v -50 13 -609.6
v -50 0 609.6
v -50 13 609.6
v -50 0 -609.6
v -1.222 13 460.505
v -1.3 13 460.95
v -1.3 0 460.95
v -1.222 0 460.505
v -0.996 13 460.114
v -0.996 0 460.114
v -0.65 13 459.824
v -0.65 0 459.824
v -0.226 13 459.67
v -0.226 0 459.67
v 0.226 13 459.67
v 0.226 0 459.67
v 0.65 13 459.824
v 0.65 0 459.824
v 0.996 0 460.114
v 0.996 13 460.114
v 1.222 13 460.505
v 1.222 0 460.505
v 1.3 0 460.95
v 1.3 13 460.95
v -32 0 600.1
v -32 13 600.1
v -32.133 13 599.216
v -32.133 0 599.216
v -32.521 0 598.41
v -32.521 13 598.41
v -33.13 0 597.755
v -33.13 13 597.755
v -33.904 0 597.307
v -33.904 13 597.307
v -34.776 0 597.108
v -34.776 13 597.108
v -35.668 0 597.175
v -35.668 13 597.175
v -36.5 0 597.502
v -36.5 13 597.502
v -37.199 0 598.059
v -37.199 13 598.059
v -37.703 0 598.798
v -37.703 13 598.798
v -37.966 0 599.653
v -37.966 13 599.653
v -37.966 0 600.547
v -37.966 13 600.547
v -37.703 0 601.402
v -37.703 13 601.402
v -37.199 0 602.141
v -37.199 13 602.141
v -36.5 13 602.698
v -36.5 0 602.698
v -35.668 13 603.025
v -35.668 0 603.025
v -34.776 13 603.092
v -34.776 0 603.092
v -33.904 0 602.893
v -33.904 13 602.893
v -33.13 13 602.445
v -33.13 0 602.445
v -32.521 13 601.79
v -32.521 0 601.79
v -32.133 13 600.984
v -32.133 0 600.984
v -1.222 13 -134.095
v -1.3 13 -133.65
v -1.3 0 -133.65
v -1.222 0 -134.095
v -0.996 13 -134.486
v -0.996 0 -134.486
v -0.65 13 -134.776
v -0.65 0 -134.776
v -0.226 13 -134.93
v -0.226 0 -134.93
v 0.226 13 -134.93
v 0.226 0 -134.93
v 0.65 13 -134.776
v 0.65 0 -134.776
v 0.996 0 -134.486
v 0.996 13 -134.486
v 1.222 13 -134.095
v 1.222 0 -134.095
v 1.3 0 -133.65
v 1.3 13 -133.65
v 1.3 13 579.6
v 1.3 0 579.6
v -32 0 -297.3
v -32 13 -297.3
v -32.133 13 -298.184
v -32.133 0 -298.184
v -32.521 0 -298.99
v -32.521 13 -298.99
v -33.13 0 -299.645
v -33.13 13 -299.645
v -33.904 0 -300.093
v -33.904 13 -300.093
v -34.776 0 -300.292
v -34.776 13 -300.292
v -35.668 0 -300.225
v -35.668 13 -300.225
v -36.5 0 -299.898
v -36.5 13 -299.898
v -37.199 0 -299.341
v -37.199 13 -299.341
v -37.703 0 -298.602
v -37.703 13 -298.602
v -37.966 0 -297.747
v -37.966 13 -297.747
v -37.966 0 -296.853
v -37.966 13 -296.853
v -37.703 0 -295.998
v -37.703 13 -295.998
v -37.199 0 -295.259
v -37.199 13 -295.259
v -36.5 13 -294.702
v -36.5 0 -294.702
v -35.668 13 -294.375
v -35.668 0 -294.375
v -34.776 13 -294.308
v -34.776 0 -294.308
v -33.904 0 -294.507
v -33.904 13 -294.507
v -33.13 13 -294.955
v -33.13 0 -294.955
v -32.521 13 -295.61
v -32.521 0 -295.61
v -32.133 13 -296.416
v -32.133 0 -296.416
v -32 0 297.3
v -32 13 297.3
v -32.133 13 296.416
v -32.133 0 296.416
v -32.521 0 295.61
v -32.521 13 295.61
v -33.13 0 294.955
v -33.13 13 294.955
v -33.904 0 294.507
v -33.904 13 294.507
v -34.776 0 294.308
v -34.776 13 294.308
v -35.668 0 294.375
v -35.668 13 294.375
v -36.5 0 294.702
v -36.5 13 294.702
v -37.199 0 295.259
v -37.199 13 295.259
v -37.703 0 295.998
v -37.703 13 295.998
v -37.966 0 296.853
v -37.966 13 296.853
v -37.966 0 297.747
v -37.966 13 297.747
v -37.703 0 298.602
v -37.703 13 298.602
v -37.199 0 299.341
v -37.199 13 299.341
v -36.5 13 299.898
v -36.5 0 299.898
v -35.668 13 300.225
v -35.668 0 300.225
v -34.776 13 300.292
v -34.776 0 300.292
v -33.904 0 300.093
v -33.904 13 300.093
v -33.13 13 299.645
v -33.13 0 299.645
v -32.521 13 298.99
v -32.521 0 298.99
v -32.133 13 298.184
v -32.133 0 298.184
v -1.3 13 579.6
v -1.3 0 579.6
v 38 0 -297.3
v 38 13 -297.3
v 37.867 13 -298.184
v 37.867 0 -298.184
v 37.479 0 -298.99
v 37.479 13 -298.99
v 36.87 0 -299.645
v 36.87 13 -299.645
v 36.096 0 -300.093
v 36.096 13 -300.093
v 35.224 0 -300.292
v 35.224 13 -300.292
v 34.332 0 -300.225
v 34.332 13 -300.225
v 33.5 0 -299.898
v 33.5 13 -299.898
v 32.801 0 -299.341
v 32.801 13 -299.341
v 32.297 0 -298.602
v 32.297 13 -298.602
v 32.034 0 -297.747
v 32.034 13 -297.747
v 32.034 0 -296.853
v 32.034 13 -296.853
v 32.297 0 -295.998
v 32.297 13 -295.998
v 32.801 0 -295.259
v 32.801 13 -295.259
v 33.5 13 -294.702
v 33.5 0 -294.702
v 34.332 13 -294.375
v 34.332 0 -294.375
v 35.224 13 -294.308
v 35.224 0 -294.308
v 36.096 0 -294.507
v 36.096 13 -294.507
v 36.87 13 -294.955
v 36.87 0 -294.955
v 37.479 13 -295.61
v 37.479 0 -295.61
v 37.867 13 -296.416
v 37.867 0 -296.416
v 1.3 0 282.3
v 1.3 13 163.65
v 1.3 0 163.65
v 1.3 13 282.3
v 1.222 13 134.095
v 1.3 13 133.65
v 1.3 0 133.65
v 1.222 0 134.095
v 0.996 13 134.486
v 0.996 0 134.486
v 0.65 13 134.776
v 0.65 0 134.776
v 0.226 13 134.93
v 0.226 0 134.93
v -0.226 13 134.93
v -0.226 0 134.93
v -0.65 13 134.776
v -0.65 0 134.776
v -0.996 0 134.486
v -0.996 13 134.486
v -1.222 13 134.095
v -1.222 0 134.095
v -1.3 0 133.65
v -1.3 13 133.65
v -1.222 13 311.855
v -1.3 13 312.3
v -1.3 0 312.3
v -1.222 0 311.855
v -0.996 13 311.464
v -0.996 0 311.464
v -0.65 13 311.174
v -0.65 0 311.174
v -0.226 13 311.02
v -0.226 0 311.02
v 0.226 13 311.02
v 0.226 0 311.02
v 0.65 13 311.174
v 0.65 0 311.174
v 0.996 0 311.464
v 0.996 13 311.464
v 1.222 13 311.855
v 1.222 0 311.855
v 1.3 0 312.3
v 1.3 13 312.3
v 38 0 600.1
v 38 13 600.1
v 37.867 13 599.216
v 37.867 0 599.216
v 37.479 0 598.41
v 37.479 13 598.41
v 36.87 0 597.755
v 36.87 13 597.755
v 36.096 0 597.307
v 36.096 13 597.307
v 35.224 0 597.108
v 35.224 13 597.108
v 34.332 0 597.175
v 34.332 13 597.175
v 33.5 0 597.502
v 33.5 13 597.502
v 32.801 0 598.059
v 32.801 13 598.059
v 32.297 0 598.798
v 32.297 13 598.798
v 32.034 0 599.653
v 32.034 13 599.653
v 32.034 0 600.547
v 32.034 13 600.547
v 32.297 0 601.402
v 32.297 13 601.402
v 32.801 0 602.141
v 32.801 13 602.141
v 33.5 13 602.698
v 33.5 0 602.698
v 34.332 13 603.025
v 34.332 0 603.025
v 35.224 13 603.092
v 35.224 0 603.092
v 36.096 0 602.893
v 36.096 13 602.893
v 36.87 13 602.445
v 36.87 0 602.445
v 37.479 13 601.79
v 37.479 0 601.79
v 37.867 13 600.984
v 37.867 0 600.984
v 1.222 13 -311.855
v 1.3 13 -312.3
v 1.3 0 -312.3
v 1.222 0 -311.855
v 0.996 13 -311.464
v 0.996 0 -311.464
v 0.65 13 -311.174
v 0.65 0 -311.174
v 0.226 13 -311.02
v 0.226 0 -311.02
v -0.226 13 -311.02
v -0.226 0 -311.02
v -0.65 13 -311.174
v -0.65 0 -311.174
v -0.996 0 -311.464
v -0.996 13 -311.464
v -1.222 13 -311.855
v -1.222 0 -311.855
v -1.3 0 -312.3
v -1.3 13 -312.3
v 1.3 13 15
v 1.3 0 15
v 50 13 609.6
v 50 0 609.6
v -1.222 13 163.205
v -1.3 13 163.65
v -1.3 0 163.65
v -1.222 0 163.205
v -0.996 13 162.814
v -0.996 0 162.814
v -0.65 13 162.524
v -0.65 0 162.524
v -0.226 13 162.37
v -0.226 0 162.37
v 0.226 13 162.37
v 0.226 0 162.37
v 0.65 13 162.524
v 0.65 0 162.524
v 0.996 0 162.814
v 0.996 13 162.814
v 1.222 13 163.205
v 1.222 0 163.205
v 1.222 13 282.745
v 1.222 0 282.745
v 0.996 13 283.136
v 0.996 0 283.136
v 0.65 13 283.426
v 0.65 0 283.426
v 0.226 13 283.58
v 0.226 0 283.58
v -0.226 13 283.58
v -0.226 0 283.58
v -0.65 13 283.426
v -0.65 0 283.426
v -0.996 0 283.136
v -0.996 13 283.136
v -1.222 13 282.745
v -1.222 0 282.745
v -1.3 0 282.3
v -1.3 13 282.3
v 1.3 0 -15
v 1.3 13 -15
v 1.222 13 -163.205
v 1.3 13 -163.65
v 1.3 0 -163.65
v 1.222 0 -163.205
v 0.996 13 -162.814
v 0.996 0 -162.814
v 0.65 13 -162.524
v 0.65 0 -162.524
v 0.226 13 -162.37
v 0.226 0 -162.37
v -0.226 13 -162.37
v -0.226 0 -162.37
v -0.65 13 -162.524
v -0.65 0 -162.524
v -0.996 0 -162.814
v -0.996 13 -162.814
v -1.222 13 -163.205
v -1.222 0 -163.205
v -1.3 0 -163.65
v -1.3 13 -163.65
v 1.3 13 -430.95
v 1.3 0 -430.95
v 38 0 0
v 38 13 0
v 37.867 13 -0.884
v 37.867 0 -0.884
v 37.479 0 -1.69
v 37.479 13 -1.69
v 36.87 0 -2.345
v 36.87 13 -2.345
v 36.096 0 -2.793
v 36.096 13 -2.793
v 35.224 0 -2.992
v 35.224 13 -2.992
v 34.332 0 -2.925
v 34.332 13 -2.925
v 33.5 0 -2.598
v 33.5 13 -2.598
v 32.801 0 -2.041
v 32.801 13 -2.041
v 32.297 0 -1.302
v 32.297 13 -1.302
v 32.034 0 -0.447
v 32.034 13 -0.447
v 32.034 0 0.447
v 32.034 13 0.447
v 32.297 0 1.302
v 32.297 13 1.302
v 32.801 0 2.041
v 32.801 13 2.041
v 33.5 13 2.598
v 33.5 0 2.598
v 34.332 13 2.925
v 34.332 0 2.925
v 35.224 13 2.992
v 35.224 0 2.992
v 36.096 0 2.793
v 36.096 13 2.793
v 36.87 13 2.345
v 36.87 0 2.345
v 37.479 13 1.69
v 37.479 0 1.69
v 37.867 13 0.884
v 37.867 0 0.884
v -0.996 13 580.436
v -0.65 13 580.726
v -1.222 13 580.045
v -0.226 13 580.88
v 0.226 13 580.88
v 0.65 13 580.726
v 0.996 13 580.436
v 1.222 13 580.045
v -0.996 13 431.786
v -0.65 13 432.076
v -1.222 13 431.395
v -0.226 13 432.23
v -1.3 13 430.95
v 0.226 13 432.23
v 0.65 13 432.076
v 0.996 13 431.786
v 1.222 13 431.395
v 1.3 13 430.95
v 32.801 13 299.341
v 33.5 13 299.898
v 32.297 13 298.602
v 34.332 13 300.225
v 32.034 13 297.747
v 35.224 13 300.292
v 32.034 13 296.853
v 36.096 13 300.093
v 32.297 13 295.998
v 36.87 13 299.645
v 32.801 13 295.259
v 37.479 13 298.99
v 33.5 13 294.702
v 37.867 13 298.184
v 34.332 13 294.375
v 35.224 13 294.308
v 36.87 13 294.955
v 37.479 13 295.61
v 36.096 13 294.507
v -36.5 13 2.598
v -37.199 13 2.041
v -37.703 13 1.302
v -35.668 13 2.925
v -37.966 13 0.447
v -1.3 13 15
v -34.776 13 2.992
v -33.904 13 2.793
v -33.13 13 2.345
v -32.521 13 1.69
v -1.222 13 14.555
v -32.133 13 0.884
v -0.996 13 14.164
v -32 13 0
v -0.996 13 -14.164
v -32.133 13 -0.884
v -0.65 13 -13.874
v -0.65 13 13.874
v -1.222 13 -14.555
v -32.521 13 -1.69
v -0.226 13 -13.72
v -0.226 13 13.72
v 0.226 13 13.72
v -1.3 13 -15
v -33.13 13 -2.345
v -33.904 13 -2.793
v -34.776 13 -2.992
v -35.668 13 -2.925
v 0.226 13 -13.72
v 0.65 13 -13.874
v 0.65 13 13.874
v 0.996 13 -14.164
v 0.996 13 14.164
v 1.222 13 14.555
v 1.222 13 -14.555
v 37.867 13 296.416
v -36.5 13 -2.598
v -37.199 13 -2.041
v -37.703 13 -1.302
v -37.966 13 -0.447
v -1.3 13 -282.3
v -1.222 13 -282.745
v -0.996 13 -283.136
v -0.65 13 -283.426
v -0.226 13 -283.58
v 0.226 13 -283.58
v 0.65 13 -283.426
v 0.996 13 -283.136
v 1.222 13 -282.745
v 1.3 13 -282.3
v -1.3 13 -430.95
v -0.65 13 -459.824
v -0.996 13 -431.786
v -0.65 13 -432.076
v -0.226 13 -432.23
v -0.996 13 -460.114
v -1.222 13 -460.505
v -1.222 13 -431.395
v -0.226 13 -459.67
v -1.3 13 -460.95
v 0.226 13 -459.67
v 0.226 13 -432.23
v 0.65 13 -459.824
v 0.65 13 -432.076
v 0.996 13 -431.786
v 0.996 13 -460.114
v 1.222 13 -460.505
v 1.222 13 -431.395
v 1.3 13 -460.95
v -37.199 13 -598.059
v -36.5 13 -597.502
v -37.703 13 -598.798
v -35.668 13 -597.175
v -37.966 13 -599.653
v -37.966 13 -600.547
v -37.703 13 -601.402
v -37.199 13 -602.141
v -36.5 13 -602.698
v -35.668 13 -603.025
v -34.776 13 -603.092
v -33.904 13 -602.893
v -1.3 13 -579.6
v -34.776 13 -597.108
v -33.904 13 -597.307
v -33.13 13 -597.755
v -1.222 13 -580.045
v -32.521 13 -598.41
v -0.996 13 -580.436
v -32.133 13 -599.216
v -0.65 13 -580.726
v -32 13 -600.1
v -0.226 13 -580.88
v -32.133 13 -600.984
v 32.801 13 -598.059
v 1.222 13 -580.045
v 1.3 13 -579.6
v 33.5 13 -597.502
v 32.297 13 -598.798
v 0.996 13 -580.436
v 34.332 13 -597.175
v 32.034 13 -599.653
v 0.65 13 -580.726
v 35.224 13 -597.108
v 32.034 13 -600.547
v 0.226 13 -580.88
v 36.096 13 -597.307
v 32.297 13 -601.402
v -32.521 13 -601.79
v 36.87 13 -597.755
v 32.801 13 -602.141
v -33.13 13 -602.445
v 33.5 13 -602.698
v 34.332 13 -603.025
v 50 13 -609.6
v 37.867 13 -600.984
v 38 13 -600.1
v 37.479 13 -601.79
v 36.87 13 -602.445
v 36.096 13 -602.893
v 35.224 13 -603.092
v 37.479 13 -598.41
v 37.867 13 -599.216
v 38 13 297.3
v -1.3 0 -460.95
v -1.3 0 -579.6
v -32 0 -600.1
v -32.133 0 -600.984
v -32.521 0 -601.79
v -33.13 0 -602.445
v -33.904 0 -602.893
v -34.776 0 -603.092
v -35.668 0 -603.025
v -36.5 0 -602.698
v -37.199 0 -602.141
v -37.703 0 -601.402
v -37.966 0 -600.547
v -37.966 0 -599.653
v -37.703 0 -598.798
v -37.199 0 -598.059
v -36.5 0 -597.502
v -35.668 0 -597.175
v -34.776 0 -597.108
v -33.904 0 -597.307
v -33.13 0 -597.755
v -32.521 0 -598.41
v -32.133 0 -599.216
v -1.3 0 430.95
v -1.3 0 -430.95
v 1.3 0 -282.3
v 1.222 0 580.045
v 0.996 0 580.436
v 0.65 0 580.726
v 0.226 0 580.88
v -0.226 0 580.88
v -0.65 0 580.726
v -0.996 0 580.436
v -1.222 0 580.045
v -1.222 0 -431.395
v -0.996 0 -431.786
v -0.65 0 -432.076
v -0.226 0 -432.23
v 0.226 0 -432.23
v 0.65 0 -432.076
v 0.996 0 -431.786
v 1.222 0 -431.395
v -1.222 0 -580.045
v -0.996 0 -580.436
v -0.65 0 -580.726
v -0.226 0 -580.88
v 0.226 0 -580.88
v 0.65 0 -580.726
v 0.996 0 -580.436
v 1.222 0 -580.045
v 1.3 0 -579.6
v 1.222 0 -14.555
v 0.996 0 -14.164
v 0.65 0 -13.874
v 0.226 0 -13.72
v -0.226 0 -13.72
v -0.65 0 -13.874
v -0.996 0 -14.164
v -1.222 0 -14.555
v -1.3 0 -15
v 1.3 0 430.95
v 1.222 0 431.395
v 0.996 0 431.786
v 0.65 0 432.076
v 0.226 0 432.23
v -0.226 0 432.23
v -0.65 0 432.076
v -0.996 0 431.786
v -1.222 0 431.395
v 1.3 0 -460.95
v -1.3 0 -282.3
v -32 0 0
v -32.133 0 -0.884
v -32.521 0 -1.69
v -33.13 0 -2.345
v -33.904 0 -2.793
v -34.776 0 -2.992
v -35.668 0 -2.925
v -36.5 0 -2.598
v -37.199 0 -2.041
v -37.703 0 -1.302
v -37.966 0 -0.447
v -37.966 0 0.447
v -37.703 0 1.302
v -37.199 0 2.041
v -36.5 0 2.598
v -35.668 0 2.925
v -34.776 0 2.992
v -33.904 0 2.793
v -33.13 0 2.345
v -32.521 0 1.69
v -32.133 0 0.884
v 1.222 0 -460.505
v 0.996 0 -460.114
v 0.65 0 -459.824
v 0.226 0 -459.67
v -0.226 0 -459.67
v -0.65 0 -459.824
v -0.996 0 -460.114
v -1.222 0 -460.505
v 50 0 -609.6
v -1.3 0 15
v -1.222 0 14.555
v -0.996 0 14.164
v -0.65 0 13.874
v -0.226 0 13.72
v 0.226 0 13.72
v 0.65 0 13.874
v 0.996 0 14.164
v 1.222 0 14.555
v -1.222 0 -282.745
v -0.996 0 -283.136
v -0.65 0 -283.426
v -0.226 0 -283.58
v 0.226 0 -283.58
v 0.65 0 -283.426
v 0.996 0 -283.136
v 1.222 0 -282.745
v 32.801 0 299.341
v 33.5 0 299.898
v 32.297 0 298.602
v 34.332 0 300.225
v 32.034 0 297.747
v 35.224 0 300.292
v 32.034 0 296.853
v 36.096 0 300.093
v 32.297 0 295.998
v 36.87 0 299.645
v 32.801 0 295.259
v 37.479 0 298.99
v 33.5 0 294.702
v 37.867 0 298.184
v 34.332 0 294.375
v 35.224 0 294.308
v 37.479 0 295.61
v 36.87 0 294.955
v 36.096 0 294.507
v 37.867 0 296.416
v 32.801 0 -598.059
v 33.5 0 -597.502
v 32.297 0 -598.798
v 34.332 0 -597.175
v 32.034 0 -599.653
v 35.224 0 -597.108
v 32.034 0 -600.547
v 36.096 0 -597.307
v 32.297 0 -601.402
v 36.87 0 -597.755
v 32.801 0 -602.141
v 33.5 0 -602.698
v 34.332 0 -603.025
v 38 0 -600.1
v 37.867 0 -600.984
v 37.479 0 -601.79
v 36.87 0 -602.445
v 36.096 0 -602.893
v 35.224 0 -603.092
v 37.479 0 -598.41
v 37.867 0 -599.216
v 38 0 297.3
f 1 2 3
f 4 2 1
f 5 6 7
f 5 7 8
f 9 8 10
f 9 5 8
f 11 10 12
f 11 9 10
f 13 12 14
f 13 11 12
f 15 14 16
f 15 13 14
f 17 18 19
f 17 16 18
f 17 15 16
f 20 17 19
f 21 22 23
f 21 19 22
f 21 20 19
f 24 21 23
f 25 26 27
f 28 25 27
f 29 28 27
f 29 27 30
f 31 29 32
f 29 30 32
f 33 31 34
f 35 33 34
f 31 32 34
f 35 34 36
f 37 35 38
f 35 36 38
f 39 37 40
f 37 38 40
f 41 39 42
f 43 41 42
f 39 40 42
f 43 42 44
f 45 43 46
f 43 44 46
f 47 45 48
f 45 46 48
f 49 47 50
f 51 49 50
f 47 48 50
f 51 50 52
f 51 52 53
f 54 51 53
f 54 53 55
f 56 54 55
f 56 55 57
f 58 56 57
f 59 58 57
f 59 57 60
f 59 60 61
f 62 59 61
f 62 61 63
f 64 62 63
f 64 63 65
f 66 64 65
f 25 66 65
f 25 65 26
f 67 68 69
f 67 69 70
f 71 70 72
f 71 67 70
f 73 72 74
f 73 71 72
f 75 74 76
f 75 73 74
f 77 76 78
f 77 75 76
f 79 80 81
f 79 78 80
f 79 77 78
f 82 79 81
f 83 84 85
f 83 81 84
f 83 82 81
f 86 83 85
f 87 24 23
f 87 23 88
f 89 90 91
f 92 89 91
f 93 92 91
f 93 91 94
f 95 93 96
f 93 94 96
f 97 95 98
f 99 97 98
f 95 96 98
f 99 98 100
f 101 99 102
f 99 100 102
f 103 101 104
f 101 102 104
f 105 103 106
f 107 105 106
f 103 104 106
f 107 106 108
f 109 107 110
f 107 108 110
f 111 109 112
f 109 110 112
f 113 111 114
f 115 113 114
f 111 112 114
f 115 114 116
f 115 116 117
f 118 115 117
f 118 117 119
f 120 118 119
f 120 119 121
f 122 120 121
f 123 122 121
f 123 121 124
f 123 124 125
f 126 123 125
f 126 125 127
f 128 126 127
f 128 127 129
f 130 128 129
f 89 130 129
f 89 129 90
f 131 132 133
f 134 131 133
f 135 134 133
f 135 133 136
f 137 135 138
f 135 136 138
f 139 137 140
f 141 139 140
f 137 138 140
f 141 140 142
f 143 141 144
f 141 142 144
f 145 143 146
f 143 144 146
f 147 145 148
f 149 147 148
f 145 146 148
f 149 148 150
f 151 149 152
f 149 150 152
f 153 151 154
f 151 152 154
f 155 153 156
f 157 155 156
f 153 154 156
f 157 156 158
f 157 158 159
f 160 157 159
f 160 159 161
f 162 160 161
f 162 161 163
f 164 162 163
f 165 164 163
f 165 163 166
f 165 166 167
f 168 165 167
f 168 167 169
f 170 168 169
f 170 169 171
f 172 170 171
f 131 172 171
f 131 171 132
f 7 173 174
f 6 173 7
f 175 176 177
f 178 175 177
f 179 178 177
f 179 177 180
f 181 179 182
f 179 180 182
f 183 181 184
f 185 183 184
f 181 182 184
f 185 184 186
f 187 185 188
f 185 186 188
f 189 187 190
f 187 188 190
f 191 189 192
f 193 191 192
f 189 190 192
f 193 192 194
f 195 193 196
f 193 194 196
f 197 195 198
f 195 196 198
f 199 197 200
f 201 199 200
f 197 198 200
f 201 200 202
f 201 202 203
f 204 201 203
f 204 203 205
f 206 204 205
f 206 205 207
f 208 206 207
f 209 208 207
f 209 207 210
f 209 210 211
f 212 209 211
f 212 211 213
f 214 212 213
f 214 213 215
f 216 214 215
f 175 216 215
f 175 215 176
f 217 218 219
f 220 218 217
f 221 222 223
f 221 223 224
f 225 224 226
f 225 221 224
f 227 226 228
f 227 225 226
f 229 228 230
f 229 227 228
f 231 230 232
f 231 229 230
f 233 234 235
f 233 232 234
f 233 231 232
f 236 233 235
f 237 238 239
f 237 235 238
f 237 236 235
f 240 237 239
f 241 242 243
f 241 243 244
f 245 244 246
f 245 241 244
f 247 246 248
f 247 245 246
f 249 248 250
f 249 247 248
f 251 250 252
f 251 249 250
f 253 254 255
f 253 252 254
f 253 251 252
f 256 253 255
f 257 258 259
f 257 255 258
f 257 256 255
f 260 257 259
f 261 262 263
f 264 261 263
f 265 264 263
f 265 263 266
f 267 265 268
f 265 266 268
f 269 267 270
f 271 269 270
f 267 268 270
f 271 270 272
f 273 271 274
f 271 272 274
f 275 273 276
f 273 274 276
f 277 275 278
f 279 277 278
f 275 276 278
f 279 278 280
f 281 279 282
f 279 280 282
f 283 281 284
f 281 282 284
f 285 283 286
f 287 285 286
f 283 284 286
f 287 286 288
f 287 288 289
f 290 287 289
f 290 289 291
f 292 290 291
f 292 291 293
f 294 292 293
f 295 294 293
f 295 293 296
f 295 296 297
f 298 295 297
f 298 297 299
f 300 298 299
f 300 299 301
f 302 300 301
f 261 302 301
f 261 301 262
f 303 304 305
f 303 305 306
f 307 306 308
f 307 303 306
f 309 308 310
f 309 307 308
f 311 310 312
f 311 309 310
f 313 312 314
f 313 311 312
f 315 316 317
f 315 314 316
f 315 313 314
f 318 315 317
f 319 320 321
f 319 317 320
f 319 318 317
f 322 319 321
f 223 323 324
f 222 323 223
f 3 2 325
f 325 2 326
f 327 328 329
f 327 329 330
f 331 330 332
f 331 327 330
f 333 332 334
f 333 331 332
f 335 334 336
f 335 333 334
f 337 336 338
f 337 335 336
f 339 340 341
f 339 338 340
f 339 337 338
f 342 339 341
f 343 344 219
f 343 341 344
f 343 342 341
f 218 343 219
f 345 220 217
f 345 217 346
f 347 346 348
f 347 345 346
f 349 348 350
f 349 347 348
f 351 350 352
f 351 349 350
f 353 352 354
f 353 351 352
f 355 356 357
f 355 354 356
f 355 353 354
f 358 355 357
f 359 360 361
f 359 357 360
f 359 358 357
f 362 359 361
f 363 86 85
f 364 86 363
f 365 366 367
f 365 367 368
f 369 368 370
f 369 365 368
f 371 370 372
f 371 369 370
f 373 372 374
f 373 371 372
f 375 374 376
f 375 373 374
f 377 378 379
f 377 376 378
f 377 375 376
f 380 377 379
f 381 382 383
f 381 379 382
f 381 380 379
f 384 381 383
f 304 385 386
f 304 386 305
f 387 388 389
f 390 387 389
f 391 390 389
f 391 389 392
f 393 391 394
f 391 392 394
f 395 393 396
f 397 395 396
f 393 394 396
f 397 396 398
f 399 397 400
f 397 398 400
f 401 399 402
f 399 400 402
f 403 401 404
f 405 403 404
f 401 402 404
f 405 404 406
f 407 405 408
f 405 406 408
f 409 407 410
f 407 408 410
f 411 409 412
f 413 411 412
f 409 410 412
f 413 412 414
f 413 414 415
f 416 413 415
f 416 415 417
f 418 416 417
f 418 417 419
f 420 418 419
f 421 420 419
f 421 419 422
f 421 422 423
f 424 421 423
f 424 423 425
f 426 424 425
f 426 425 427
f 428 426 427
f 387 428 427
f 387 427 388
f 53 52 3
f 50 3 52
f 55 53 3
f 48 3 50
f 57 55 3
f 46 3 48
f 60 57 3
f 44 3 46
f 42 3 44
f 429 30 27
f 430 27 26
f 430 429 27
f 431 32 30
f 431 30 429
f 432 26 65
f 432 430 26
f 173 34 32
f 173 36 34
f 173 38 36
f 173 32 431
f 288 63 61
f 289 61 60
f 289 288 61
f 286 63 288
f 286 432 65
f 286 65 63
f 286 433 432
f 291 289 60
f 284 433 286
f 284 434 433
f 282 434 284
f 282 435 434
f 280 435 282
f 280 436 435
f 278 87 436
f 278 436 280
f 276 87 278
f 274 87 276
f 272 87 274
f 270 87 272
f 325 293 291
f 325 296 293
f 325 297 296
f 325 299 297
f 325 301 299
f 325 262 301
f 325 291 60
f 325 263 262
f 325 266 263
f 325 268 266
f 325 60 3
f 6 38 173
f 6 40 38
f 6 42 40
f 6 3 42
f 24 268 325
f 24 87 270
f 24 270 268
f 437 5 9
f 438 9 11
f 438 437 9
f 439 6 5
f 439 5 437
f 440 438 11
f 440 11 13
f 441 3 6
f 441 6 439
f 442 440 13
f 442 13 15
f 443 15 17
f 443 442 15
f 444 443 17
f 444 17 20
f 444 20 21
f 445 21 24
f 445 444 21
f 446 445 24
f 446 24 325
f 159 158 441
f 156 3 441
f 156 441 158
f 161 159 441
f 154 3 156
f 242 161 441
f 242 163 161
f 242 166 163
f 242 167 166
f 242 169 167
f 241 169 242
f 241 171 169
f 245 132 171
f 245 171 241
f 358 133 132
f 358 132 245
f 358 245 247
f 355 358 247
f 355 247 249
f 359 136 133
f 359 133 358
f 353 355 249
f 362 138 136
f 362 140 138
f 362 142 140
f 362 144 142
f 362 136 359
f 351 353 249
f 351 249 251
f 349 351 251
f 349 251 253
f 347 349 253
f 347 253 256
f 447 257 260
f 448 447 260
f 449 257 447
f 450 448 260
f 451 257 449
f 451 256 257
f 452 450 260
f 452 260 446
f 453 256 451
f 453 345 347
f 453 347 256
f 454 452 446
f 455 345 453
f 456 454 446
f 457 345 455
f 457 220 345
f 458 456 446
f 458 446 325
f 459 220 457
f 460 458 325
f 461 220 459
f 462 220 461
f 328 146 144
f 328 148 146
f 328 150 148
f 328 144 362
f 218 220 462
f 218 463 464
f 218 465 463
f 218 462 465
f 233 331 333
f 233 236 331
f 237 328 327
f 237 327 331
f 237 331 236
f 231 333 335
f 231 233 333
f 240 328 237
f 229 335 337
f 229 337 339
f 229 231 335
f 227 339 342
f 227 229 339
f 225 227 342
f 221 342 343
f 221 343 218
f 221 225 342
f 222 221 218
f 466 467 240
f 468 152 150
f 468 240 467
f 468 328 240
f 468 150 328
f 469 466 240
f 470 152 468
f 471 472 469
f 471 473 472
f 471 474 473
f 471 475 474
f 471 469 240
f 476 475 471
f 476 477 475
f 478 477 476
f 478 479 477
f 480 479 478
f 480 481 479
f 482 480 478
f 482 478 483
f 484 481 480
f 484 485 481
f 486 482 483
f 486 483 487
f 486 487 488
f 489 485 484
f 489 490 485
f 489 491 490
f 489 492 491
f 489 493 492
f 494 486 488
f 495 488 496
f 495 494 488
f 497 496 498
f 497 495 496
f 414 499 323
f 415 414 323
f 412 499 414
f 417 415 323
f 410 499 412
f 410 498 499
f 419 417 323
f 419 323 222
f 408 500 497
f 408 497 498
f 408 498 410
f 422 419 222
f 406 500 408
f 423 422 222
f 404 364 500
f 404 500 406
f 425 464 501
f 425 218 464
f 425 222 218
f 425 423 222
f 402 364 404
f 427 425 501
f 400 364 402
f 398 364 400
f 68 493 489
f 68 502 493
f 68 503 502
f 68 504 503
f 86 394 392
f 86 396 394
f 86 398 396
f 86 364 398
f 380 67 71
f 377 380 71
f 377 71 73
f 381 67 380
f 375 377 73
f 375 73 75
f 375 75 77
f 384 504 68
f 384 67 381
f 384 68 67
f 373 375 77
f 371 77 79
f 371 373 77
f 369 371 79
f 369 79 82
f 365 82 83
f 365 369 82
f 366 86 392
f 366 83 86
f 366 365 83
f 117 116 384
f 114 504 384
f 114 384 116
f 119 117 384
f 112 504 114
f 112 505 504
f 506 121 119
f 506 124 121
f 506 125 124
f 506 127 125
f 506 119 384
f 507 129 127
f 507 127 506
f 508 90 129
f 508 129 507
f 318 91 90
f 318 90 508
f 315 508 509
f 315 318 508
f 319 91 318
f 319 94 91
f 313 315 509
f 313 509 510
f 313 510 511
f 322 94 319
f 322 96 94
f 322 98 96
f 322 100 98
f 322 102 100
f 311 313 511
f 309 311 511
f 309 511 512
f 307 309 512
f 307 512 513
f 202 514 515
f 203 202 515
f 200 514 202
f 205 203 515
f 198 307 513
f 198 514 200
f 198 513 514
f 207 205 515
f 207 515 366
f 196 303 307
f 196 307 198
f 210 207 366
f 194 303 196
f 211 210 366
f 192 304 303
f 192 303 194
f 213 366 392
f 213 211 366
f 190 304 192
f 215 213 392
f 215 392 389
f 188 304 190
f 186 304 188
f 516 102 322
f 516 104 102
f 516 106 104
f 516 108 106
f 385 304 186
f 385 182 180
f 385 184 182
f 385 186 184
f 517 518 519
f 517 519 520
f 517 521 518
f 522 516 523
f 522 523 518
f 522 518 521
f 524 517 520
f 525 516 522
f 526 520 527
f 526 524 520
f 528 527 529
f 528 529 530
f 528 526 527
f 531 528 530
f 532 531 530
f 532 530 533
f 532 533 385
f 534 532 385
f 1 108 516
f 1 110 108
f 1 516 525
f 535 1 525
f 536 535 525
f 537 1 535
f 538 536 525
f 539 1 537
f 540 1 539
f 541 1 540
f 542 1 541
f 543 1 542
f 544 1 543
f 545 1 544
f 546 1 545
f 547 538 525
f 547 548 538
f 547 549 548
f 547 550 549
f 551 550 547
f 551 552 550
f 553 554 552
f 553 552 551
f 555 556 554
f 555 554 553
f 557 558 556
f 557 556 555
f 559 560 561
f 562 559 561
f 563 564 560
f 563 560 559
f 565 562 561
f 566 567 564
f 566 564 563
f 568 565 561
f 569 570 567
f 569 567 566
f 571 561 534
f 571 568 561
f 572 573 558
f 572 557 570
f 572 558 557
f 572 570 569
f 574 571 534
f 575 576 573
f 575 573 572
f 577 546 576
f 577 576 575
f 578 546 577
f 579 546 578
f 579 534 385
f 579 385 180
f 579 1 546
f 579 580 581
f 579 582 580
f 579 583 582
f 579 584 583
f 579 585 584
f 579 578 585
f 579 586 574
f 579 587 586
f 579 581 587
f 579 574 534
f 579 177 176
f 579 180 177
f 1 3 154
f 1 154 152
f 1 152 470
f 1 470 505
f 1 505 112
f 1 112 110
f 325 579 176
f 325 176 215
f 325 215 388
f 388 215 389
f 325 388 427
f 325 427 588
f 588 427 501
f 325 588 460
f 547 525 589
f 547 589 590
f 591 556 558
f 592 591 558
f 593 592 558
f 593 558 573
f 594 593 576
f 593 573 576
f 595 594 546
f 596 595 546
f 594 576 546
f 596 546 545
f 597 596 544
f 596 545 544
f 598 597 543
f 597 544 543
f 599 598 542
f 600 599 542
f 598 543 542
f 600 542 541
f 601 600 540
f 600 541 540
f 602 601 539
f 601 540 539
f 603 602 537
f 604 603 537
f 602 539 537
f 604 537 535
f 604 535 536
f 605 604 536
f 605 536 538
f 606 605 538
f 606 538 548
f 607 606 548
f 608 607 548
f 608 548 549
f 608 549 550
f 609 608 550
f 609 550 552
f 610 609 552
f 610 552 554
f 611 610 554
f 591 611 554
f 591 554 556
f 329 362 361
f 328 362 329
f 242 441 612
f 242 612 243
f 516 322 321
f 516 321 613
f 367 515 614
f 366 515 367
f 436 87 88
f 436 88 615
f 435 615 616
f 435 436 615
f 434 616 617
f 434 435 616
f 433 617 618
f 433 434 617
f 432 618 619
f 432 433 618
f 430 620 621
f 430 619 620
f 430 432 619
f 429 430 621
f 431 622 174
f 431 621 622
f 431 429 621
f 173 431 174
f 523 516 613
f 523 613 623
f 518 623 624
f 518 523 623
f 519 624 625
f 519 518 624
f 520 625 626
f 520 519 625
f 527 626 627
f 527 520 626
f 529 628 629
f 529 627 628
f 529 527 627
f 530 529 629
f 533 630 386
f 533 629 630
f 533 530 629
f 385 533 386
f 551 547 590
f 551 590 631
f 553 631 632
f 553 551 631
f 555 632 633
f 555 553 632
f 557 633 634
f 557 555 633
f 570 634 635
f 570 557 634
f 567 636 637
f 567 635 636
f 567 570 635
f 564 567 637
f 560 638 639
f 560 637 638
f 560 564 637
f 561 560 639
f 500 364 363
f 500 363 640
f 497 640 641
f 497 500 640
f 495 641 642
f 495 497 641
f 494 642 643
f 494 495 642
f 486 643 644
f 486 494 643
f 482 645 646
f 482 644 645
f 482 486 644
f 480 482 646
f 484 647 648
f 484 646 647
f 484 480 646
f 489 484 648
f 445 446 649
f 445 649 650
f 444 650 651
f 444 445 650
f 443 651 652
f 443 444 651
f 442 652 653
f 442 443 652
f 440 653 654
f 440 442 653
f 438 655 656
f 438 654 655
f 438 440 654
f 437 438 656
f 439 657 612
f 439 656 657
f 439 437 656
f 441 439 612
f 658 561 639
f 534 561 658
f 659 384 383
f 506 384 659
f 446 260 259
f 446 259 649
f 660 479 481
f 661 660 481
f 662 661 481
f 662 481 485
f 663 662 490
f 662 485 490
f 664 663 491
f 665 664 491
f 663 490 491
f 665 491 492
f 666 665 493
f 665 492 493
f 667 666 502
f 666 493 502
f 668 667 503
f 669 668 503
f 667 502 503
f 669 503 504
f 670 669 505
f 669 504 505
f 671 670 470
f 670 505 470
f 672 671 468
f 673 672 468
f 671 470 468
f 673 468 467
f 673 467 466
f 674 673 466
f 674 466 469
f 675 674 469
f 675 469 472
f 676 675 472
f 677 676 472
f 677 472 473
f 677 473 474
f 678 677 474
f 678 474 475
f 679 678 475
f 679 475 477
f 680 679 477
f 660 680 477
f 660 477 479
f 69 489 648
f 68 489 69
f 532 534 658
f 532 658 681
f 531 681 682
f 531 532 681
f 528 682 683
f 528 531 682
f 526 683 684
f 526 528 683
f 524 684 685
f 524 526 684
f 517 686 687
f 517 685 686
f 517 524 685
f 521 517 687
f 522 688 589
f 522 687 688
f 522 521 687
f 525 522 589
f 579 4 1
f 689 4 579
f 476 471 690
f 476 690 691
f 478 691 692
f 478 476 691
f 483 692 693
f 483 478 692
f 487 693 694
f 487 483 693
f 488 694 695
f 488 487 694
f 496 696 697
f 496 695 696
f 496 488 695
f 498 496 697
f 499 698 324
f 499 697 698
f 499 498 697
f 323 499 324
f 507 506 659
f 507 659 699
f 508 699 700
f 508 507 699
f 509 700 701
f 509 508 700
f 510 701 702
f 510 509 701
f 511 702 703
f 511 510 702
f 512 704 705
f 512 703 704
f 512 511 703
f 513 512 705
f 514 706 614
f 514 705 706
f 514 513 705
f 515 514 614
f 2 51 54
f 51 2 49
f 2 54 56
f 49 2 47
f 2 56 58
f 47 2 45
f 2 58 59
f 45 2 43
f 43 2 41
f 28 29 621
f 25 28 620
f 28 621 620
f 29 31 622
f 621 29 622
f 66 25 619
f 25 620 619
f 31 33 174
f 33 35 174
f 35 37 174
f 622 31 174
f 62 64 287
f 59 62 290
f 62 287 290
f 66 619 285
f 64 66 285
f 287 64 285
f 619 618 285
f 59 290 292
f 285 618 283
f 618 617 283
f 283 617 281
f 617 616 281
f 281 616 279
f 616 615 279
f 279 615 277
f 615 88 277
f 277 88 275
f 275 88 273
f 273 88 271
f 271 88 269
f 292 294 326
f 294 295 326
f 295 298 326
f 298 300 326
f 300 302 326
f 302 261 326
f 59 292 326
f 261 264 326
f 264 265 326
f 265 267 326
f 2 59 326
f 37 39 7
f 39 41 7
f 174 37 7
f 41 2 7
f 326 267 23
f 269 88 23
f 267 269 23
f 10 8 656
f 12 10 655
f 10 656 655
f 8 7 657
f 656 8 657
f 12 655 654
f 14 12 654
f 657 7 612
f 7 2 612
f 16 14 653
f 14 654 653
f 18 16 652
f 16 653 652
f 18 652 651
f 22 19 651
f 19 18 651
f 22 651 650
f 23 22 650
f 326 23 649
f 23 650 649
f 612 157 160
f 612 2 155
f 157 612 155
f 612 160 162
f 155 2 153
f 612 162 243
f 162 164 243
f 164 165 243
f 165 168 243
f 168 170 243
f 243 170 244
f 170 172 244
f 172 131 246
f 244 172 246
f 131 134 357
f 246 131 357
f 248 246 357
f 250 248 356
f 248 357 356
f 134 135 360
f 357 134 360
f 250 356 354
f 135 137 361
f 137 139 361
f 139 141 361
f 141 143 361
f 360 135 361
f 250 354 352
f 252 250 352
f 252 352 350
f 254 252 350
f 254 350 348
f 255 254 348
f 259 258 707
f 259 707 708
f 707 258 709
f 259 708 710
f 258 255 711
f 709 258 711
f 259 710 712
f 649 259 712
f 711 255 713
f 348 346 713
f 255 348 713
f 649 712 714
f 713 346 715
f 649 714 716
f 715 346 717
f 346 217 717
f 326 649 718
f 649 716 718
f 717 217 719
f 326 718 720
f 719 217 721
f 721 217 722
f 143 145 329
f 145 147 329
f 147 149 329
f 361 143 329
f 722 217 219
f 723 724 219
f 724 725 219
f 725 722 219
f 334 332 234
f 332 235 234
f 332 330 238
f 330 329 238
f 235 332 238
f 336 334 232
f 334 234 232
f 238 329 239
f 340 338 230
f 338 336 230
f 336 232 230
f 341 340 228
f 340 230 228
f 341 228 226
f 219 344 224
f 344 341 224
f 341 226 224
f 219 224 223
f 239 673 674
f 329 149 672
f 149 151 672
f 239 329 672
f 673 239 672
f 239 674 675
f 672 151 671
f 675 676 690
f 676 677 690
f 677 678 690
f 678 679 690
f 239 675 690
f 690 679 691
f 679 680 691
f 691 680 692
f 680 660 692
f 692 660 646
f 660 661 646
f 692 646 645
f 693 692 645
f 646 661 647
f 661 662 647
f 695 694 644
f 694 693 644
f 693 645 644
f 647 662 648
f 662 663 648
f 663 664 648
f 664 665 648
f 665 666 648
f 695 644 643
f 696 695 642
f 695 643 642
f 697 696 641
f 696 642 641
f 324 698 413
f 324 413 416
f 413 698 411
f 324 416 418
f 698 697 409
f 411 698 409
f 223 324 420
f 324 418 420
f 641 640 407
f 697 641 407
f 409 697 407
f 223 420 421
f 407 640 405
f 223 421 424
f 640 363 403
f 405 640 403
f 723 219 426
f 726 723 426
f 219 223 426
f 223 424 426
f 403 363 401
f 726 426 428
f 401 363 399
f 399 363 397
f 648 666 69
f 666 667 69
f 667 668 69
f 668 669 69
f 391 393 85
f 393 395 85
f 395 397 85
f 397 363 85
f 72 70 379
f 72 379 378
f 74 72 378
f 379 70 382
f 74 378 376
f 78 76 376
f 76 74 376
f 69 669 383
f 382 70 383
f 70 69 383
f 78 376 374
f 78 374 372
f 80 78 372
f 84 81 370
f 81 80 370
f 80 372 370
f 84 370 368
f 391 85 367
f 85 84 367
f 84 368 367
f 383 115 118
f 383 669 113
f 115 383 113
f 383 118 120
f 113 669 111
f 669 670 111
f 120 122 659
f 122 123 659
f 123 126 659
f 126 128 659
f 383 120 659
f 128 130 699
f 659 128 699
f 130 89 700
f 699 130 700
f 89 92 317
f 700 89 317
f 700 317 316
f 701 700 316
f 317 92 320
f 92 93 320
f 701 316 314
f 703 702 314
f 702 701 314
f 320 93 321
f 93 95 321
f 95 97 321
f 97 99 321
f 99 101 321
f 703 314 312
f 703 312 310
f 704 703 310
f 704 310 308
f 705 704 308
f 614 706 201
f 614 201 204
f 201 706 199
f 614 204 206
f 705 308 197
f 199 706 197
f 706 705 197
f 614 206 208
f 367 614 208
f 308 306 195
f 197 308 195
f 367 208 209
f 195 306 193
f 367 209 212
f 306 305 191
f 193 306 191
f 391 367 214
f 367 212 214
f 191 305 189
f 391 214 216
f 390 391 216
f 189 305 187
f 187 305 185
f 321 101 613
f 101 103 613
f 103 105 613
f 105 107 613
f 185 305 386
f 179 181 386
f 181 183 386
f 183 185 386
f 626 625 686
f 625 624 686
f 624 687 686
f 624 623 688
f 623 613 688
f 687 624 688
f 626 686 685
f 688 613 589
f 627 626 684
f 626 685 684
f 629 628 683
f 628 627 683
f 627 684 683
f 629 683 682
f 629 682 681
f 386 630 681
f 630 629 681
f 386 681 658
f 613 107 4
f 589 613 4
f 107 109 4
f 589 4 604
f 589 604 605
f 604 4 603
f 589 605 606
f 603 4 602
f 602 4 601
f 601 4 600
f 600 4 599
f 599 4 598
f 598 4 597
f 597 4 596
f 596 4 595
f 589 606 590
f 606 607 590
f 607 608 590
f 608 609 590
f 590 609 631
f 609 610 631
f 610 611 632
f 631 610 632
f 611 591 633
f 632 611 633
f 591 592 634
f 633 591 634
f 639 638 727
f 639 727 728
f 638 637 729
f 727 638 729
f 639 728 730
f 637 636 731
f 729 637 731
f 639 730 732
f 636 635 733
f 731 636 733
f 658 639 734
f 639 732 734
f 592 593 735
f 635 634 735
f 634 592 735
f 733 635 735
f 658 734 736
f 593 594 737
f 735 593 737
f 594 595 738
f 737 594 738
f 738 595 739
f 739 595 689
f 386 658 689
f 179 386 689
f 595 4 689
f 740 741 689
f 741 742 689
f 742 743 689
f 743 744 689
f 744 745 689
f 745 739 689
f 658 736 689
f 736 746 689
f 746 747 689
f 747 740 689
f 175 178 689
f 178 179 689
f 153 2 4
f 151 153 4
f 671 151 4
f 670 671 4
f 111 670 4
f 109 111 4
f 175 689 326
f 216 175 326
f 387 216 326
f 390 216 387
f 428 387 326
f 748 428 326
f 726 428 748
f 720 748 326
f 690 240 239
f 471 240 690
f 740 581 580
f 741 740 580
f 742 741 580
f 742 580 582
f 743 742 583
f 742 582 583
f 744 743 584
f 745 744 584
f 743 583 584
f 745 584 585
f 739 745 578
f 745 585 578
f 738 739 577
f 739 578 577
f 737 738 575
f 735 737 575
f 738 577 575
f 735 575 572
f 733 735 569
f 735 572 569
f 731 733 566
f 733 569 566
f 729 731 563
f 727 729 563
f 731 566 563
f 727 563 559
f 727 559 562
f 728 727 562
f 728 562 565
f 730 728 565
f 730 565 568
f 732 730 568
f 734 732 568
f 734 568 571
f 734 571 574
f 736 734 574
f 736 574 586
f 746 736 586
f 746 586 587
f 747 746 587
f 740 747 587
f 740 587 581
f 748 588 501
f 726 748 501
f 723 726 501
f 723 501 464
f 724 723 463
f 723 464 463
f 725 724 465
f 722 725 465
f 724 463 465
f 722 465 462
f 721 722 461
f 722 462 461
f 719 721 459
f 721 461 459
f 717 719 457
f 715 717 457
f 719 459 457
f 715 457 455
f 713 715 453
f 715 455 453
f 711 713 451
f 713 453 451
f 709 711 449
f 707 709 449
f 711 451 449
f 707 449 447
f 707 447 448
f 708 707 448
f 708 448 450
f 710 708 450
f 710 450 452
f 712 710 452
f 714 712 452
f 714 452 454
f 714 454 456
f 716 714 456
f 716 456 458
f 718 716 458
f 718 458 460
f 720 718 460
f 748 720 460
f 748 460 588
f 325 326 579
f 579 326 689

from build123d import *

# Parameters (mm, degrees)
SKETCH1_W           = 100
SKETCH1_H           = 1219.2
BOSS_EXTRUDE1_DEPTH = 13
SKETCH6_R           = 3
CUT_EXTRUDE4_DEPTH  = 20
CUT_EXTRUDE5_DEPTH  = 30


with BuildPart() as part:
    # Sketch1 → Boss-Extrude1 (new body)
    with BuildSketch(Plane(origin=(0, 0, 0), x_dir=(1, 0, 0), z_dir=(0, 1, 0))):
        Rectangle(SKETCH1_W, SKETCH1_H)
    extrude(amount=BOSS_EXTRUDE1_DEPTH)

    # Sketch6 → Cut-Extrude4 (cut)
    with BuildSketch(Plane(origin=(0, 13, 0), x_dir=(1, 0, 0), z_dir=(0, 1, 0))):
        with Locations((35, 0)):
            Circle(SKETCH6_R)
        with Locations((-35, 0)):
            Circle(SKETCH6_R)
        with Locations((35, -297.3)):
            Circle(SKETCH6_R)
        with Locations((-35, -297.3)):
            Circle(SKETCH6_R)
        with Locations((35, 600.1)):
            Circle(SKETCH6_R)
        with Locations((-35, 600.1)):
            Circle(SKETCH6_R)
        with Locations((-35, 297.3)):
            Circle(SKETCH6_R)
        with Locations((35, 297.3)):
            Circle(SKETCH6_R)
        with Locations((-35, -600.1)):
            Circle(SKETCH6_R)
        with Locations((35, -600.1)):
            Circle(SKETCH6_R)
    extrude(amount=-CUT_EXTRUDE4_DEPTH, mode=Mode.SUBTRACT)

    # Sketch7 → Cut-Extrude5 (cut)
    with BuildSketch(Plane(origin=(0, 13, 0), x_dir=(1, 0, 0), z_dir=(0, 1, 0))):
        with BuildLine():
            Line((1.3, -460.95), (1.3, -579.6))
            ThreePointArc((1.3, -579.6), (0, -580.9), (-1.3, -579.6))
            Line((-1.3, -579.6), (-1.3, -460.95))
            ThreePointArc((-1.3, -460.95), (0, -459.65), (1.3, -460.95))
        make_face()
        with BuildLine():
            Line((1.3, -312.3), (1.3, -430.95))
            ThreePointArc((1.3, -430.95), (0, -432.25), (-1.3, -430.95))
            Line((-1.3, -430.95), (-1.3, -312.3))
            ThreePointArc((-1.3, -312.3), (0, -311), (1.3, -312.3))
        make_face()
        with BuildLine():
            Line((1.3, -163.65), (1.3, -282.3))
            ThreePointArc((1.3, -282.3), (0, -283.6), (-1.3, -282.3))
            Line((-1.3, -282.3), (-1.3, -163.65))
            ThreePointArc((-1.3, -163.65), (0, -162.35), (1.3, -163.65))
        make_face()
        with BuildLine():
            Line((1.3, -15), (1.3, -133.65))
            ThreePointArc((1.3, -133.65), (0, -134.95), (-1.3, -133.65))
            Line((-1.3, -133.65), (-1.3, -15))
            ThreePointArc((-1.3, -15), (0, -13.7), (1.3, -15))
        make_face()
        with BuildLine():
            Line((1.3, 133.65), (1.3, 15))
            ThreePointArc((1.3, 15), (0, 13.7), (-1.3, 15))
            Line((-1.3, 15), (-1.3, 133.65))
            ThreePointArc((-1.3, 133.65), (0, 134.95), (1.3, 133.65))
        make_face()
        with BuildLine():
            Line((1.3, 282.3), (1.3, 163.65))
            ThreePointArc((1.3, 163.65), (0, 162.35), (-1.3, 163.65))
            Line((-1.3, 163.65), (-1.3, 282.3))
            ThreePointArc((-1.3, 282.3), (0, 283.6), (1.3, 282.3))
        make_face()
        with BuildLine():
            Line((1.3, 430.95), (1.3, 312.3))
            ThreePointArc((1.3, 312.3), (0, 311), (-1.3, 312.3))
            Line((-1.3, 312.3), (-1.3, 430.95))
            ThreePointArc((-1.3, 430.95), (0, 432.25), (1.3, 430.95))
        make_face()
        with BuildLine():
            Line((1.3, 579.6), (1.3, 460.95))
            ThreePointArc((1.3, 460.95), (0, 459.65), (-1.3, 460.95))
            Line((-1.3, 460.95), (-1.3, 579.6))
            ThreePointArc((-1.3, 579.6), (0, 580.9), (1.3, 579.6))
        make_face()
    extrude(amount=-CUT_EXTRUDE5_DEPTH, mode=Mode.SUBTRACT)


solid = part.part
